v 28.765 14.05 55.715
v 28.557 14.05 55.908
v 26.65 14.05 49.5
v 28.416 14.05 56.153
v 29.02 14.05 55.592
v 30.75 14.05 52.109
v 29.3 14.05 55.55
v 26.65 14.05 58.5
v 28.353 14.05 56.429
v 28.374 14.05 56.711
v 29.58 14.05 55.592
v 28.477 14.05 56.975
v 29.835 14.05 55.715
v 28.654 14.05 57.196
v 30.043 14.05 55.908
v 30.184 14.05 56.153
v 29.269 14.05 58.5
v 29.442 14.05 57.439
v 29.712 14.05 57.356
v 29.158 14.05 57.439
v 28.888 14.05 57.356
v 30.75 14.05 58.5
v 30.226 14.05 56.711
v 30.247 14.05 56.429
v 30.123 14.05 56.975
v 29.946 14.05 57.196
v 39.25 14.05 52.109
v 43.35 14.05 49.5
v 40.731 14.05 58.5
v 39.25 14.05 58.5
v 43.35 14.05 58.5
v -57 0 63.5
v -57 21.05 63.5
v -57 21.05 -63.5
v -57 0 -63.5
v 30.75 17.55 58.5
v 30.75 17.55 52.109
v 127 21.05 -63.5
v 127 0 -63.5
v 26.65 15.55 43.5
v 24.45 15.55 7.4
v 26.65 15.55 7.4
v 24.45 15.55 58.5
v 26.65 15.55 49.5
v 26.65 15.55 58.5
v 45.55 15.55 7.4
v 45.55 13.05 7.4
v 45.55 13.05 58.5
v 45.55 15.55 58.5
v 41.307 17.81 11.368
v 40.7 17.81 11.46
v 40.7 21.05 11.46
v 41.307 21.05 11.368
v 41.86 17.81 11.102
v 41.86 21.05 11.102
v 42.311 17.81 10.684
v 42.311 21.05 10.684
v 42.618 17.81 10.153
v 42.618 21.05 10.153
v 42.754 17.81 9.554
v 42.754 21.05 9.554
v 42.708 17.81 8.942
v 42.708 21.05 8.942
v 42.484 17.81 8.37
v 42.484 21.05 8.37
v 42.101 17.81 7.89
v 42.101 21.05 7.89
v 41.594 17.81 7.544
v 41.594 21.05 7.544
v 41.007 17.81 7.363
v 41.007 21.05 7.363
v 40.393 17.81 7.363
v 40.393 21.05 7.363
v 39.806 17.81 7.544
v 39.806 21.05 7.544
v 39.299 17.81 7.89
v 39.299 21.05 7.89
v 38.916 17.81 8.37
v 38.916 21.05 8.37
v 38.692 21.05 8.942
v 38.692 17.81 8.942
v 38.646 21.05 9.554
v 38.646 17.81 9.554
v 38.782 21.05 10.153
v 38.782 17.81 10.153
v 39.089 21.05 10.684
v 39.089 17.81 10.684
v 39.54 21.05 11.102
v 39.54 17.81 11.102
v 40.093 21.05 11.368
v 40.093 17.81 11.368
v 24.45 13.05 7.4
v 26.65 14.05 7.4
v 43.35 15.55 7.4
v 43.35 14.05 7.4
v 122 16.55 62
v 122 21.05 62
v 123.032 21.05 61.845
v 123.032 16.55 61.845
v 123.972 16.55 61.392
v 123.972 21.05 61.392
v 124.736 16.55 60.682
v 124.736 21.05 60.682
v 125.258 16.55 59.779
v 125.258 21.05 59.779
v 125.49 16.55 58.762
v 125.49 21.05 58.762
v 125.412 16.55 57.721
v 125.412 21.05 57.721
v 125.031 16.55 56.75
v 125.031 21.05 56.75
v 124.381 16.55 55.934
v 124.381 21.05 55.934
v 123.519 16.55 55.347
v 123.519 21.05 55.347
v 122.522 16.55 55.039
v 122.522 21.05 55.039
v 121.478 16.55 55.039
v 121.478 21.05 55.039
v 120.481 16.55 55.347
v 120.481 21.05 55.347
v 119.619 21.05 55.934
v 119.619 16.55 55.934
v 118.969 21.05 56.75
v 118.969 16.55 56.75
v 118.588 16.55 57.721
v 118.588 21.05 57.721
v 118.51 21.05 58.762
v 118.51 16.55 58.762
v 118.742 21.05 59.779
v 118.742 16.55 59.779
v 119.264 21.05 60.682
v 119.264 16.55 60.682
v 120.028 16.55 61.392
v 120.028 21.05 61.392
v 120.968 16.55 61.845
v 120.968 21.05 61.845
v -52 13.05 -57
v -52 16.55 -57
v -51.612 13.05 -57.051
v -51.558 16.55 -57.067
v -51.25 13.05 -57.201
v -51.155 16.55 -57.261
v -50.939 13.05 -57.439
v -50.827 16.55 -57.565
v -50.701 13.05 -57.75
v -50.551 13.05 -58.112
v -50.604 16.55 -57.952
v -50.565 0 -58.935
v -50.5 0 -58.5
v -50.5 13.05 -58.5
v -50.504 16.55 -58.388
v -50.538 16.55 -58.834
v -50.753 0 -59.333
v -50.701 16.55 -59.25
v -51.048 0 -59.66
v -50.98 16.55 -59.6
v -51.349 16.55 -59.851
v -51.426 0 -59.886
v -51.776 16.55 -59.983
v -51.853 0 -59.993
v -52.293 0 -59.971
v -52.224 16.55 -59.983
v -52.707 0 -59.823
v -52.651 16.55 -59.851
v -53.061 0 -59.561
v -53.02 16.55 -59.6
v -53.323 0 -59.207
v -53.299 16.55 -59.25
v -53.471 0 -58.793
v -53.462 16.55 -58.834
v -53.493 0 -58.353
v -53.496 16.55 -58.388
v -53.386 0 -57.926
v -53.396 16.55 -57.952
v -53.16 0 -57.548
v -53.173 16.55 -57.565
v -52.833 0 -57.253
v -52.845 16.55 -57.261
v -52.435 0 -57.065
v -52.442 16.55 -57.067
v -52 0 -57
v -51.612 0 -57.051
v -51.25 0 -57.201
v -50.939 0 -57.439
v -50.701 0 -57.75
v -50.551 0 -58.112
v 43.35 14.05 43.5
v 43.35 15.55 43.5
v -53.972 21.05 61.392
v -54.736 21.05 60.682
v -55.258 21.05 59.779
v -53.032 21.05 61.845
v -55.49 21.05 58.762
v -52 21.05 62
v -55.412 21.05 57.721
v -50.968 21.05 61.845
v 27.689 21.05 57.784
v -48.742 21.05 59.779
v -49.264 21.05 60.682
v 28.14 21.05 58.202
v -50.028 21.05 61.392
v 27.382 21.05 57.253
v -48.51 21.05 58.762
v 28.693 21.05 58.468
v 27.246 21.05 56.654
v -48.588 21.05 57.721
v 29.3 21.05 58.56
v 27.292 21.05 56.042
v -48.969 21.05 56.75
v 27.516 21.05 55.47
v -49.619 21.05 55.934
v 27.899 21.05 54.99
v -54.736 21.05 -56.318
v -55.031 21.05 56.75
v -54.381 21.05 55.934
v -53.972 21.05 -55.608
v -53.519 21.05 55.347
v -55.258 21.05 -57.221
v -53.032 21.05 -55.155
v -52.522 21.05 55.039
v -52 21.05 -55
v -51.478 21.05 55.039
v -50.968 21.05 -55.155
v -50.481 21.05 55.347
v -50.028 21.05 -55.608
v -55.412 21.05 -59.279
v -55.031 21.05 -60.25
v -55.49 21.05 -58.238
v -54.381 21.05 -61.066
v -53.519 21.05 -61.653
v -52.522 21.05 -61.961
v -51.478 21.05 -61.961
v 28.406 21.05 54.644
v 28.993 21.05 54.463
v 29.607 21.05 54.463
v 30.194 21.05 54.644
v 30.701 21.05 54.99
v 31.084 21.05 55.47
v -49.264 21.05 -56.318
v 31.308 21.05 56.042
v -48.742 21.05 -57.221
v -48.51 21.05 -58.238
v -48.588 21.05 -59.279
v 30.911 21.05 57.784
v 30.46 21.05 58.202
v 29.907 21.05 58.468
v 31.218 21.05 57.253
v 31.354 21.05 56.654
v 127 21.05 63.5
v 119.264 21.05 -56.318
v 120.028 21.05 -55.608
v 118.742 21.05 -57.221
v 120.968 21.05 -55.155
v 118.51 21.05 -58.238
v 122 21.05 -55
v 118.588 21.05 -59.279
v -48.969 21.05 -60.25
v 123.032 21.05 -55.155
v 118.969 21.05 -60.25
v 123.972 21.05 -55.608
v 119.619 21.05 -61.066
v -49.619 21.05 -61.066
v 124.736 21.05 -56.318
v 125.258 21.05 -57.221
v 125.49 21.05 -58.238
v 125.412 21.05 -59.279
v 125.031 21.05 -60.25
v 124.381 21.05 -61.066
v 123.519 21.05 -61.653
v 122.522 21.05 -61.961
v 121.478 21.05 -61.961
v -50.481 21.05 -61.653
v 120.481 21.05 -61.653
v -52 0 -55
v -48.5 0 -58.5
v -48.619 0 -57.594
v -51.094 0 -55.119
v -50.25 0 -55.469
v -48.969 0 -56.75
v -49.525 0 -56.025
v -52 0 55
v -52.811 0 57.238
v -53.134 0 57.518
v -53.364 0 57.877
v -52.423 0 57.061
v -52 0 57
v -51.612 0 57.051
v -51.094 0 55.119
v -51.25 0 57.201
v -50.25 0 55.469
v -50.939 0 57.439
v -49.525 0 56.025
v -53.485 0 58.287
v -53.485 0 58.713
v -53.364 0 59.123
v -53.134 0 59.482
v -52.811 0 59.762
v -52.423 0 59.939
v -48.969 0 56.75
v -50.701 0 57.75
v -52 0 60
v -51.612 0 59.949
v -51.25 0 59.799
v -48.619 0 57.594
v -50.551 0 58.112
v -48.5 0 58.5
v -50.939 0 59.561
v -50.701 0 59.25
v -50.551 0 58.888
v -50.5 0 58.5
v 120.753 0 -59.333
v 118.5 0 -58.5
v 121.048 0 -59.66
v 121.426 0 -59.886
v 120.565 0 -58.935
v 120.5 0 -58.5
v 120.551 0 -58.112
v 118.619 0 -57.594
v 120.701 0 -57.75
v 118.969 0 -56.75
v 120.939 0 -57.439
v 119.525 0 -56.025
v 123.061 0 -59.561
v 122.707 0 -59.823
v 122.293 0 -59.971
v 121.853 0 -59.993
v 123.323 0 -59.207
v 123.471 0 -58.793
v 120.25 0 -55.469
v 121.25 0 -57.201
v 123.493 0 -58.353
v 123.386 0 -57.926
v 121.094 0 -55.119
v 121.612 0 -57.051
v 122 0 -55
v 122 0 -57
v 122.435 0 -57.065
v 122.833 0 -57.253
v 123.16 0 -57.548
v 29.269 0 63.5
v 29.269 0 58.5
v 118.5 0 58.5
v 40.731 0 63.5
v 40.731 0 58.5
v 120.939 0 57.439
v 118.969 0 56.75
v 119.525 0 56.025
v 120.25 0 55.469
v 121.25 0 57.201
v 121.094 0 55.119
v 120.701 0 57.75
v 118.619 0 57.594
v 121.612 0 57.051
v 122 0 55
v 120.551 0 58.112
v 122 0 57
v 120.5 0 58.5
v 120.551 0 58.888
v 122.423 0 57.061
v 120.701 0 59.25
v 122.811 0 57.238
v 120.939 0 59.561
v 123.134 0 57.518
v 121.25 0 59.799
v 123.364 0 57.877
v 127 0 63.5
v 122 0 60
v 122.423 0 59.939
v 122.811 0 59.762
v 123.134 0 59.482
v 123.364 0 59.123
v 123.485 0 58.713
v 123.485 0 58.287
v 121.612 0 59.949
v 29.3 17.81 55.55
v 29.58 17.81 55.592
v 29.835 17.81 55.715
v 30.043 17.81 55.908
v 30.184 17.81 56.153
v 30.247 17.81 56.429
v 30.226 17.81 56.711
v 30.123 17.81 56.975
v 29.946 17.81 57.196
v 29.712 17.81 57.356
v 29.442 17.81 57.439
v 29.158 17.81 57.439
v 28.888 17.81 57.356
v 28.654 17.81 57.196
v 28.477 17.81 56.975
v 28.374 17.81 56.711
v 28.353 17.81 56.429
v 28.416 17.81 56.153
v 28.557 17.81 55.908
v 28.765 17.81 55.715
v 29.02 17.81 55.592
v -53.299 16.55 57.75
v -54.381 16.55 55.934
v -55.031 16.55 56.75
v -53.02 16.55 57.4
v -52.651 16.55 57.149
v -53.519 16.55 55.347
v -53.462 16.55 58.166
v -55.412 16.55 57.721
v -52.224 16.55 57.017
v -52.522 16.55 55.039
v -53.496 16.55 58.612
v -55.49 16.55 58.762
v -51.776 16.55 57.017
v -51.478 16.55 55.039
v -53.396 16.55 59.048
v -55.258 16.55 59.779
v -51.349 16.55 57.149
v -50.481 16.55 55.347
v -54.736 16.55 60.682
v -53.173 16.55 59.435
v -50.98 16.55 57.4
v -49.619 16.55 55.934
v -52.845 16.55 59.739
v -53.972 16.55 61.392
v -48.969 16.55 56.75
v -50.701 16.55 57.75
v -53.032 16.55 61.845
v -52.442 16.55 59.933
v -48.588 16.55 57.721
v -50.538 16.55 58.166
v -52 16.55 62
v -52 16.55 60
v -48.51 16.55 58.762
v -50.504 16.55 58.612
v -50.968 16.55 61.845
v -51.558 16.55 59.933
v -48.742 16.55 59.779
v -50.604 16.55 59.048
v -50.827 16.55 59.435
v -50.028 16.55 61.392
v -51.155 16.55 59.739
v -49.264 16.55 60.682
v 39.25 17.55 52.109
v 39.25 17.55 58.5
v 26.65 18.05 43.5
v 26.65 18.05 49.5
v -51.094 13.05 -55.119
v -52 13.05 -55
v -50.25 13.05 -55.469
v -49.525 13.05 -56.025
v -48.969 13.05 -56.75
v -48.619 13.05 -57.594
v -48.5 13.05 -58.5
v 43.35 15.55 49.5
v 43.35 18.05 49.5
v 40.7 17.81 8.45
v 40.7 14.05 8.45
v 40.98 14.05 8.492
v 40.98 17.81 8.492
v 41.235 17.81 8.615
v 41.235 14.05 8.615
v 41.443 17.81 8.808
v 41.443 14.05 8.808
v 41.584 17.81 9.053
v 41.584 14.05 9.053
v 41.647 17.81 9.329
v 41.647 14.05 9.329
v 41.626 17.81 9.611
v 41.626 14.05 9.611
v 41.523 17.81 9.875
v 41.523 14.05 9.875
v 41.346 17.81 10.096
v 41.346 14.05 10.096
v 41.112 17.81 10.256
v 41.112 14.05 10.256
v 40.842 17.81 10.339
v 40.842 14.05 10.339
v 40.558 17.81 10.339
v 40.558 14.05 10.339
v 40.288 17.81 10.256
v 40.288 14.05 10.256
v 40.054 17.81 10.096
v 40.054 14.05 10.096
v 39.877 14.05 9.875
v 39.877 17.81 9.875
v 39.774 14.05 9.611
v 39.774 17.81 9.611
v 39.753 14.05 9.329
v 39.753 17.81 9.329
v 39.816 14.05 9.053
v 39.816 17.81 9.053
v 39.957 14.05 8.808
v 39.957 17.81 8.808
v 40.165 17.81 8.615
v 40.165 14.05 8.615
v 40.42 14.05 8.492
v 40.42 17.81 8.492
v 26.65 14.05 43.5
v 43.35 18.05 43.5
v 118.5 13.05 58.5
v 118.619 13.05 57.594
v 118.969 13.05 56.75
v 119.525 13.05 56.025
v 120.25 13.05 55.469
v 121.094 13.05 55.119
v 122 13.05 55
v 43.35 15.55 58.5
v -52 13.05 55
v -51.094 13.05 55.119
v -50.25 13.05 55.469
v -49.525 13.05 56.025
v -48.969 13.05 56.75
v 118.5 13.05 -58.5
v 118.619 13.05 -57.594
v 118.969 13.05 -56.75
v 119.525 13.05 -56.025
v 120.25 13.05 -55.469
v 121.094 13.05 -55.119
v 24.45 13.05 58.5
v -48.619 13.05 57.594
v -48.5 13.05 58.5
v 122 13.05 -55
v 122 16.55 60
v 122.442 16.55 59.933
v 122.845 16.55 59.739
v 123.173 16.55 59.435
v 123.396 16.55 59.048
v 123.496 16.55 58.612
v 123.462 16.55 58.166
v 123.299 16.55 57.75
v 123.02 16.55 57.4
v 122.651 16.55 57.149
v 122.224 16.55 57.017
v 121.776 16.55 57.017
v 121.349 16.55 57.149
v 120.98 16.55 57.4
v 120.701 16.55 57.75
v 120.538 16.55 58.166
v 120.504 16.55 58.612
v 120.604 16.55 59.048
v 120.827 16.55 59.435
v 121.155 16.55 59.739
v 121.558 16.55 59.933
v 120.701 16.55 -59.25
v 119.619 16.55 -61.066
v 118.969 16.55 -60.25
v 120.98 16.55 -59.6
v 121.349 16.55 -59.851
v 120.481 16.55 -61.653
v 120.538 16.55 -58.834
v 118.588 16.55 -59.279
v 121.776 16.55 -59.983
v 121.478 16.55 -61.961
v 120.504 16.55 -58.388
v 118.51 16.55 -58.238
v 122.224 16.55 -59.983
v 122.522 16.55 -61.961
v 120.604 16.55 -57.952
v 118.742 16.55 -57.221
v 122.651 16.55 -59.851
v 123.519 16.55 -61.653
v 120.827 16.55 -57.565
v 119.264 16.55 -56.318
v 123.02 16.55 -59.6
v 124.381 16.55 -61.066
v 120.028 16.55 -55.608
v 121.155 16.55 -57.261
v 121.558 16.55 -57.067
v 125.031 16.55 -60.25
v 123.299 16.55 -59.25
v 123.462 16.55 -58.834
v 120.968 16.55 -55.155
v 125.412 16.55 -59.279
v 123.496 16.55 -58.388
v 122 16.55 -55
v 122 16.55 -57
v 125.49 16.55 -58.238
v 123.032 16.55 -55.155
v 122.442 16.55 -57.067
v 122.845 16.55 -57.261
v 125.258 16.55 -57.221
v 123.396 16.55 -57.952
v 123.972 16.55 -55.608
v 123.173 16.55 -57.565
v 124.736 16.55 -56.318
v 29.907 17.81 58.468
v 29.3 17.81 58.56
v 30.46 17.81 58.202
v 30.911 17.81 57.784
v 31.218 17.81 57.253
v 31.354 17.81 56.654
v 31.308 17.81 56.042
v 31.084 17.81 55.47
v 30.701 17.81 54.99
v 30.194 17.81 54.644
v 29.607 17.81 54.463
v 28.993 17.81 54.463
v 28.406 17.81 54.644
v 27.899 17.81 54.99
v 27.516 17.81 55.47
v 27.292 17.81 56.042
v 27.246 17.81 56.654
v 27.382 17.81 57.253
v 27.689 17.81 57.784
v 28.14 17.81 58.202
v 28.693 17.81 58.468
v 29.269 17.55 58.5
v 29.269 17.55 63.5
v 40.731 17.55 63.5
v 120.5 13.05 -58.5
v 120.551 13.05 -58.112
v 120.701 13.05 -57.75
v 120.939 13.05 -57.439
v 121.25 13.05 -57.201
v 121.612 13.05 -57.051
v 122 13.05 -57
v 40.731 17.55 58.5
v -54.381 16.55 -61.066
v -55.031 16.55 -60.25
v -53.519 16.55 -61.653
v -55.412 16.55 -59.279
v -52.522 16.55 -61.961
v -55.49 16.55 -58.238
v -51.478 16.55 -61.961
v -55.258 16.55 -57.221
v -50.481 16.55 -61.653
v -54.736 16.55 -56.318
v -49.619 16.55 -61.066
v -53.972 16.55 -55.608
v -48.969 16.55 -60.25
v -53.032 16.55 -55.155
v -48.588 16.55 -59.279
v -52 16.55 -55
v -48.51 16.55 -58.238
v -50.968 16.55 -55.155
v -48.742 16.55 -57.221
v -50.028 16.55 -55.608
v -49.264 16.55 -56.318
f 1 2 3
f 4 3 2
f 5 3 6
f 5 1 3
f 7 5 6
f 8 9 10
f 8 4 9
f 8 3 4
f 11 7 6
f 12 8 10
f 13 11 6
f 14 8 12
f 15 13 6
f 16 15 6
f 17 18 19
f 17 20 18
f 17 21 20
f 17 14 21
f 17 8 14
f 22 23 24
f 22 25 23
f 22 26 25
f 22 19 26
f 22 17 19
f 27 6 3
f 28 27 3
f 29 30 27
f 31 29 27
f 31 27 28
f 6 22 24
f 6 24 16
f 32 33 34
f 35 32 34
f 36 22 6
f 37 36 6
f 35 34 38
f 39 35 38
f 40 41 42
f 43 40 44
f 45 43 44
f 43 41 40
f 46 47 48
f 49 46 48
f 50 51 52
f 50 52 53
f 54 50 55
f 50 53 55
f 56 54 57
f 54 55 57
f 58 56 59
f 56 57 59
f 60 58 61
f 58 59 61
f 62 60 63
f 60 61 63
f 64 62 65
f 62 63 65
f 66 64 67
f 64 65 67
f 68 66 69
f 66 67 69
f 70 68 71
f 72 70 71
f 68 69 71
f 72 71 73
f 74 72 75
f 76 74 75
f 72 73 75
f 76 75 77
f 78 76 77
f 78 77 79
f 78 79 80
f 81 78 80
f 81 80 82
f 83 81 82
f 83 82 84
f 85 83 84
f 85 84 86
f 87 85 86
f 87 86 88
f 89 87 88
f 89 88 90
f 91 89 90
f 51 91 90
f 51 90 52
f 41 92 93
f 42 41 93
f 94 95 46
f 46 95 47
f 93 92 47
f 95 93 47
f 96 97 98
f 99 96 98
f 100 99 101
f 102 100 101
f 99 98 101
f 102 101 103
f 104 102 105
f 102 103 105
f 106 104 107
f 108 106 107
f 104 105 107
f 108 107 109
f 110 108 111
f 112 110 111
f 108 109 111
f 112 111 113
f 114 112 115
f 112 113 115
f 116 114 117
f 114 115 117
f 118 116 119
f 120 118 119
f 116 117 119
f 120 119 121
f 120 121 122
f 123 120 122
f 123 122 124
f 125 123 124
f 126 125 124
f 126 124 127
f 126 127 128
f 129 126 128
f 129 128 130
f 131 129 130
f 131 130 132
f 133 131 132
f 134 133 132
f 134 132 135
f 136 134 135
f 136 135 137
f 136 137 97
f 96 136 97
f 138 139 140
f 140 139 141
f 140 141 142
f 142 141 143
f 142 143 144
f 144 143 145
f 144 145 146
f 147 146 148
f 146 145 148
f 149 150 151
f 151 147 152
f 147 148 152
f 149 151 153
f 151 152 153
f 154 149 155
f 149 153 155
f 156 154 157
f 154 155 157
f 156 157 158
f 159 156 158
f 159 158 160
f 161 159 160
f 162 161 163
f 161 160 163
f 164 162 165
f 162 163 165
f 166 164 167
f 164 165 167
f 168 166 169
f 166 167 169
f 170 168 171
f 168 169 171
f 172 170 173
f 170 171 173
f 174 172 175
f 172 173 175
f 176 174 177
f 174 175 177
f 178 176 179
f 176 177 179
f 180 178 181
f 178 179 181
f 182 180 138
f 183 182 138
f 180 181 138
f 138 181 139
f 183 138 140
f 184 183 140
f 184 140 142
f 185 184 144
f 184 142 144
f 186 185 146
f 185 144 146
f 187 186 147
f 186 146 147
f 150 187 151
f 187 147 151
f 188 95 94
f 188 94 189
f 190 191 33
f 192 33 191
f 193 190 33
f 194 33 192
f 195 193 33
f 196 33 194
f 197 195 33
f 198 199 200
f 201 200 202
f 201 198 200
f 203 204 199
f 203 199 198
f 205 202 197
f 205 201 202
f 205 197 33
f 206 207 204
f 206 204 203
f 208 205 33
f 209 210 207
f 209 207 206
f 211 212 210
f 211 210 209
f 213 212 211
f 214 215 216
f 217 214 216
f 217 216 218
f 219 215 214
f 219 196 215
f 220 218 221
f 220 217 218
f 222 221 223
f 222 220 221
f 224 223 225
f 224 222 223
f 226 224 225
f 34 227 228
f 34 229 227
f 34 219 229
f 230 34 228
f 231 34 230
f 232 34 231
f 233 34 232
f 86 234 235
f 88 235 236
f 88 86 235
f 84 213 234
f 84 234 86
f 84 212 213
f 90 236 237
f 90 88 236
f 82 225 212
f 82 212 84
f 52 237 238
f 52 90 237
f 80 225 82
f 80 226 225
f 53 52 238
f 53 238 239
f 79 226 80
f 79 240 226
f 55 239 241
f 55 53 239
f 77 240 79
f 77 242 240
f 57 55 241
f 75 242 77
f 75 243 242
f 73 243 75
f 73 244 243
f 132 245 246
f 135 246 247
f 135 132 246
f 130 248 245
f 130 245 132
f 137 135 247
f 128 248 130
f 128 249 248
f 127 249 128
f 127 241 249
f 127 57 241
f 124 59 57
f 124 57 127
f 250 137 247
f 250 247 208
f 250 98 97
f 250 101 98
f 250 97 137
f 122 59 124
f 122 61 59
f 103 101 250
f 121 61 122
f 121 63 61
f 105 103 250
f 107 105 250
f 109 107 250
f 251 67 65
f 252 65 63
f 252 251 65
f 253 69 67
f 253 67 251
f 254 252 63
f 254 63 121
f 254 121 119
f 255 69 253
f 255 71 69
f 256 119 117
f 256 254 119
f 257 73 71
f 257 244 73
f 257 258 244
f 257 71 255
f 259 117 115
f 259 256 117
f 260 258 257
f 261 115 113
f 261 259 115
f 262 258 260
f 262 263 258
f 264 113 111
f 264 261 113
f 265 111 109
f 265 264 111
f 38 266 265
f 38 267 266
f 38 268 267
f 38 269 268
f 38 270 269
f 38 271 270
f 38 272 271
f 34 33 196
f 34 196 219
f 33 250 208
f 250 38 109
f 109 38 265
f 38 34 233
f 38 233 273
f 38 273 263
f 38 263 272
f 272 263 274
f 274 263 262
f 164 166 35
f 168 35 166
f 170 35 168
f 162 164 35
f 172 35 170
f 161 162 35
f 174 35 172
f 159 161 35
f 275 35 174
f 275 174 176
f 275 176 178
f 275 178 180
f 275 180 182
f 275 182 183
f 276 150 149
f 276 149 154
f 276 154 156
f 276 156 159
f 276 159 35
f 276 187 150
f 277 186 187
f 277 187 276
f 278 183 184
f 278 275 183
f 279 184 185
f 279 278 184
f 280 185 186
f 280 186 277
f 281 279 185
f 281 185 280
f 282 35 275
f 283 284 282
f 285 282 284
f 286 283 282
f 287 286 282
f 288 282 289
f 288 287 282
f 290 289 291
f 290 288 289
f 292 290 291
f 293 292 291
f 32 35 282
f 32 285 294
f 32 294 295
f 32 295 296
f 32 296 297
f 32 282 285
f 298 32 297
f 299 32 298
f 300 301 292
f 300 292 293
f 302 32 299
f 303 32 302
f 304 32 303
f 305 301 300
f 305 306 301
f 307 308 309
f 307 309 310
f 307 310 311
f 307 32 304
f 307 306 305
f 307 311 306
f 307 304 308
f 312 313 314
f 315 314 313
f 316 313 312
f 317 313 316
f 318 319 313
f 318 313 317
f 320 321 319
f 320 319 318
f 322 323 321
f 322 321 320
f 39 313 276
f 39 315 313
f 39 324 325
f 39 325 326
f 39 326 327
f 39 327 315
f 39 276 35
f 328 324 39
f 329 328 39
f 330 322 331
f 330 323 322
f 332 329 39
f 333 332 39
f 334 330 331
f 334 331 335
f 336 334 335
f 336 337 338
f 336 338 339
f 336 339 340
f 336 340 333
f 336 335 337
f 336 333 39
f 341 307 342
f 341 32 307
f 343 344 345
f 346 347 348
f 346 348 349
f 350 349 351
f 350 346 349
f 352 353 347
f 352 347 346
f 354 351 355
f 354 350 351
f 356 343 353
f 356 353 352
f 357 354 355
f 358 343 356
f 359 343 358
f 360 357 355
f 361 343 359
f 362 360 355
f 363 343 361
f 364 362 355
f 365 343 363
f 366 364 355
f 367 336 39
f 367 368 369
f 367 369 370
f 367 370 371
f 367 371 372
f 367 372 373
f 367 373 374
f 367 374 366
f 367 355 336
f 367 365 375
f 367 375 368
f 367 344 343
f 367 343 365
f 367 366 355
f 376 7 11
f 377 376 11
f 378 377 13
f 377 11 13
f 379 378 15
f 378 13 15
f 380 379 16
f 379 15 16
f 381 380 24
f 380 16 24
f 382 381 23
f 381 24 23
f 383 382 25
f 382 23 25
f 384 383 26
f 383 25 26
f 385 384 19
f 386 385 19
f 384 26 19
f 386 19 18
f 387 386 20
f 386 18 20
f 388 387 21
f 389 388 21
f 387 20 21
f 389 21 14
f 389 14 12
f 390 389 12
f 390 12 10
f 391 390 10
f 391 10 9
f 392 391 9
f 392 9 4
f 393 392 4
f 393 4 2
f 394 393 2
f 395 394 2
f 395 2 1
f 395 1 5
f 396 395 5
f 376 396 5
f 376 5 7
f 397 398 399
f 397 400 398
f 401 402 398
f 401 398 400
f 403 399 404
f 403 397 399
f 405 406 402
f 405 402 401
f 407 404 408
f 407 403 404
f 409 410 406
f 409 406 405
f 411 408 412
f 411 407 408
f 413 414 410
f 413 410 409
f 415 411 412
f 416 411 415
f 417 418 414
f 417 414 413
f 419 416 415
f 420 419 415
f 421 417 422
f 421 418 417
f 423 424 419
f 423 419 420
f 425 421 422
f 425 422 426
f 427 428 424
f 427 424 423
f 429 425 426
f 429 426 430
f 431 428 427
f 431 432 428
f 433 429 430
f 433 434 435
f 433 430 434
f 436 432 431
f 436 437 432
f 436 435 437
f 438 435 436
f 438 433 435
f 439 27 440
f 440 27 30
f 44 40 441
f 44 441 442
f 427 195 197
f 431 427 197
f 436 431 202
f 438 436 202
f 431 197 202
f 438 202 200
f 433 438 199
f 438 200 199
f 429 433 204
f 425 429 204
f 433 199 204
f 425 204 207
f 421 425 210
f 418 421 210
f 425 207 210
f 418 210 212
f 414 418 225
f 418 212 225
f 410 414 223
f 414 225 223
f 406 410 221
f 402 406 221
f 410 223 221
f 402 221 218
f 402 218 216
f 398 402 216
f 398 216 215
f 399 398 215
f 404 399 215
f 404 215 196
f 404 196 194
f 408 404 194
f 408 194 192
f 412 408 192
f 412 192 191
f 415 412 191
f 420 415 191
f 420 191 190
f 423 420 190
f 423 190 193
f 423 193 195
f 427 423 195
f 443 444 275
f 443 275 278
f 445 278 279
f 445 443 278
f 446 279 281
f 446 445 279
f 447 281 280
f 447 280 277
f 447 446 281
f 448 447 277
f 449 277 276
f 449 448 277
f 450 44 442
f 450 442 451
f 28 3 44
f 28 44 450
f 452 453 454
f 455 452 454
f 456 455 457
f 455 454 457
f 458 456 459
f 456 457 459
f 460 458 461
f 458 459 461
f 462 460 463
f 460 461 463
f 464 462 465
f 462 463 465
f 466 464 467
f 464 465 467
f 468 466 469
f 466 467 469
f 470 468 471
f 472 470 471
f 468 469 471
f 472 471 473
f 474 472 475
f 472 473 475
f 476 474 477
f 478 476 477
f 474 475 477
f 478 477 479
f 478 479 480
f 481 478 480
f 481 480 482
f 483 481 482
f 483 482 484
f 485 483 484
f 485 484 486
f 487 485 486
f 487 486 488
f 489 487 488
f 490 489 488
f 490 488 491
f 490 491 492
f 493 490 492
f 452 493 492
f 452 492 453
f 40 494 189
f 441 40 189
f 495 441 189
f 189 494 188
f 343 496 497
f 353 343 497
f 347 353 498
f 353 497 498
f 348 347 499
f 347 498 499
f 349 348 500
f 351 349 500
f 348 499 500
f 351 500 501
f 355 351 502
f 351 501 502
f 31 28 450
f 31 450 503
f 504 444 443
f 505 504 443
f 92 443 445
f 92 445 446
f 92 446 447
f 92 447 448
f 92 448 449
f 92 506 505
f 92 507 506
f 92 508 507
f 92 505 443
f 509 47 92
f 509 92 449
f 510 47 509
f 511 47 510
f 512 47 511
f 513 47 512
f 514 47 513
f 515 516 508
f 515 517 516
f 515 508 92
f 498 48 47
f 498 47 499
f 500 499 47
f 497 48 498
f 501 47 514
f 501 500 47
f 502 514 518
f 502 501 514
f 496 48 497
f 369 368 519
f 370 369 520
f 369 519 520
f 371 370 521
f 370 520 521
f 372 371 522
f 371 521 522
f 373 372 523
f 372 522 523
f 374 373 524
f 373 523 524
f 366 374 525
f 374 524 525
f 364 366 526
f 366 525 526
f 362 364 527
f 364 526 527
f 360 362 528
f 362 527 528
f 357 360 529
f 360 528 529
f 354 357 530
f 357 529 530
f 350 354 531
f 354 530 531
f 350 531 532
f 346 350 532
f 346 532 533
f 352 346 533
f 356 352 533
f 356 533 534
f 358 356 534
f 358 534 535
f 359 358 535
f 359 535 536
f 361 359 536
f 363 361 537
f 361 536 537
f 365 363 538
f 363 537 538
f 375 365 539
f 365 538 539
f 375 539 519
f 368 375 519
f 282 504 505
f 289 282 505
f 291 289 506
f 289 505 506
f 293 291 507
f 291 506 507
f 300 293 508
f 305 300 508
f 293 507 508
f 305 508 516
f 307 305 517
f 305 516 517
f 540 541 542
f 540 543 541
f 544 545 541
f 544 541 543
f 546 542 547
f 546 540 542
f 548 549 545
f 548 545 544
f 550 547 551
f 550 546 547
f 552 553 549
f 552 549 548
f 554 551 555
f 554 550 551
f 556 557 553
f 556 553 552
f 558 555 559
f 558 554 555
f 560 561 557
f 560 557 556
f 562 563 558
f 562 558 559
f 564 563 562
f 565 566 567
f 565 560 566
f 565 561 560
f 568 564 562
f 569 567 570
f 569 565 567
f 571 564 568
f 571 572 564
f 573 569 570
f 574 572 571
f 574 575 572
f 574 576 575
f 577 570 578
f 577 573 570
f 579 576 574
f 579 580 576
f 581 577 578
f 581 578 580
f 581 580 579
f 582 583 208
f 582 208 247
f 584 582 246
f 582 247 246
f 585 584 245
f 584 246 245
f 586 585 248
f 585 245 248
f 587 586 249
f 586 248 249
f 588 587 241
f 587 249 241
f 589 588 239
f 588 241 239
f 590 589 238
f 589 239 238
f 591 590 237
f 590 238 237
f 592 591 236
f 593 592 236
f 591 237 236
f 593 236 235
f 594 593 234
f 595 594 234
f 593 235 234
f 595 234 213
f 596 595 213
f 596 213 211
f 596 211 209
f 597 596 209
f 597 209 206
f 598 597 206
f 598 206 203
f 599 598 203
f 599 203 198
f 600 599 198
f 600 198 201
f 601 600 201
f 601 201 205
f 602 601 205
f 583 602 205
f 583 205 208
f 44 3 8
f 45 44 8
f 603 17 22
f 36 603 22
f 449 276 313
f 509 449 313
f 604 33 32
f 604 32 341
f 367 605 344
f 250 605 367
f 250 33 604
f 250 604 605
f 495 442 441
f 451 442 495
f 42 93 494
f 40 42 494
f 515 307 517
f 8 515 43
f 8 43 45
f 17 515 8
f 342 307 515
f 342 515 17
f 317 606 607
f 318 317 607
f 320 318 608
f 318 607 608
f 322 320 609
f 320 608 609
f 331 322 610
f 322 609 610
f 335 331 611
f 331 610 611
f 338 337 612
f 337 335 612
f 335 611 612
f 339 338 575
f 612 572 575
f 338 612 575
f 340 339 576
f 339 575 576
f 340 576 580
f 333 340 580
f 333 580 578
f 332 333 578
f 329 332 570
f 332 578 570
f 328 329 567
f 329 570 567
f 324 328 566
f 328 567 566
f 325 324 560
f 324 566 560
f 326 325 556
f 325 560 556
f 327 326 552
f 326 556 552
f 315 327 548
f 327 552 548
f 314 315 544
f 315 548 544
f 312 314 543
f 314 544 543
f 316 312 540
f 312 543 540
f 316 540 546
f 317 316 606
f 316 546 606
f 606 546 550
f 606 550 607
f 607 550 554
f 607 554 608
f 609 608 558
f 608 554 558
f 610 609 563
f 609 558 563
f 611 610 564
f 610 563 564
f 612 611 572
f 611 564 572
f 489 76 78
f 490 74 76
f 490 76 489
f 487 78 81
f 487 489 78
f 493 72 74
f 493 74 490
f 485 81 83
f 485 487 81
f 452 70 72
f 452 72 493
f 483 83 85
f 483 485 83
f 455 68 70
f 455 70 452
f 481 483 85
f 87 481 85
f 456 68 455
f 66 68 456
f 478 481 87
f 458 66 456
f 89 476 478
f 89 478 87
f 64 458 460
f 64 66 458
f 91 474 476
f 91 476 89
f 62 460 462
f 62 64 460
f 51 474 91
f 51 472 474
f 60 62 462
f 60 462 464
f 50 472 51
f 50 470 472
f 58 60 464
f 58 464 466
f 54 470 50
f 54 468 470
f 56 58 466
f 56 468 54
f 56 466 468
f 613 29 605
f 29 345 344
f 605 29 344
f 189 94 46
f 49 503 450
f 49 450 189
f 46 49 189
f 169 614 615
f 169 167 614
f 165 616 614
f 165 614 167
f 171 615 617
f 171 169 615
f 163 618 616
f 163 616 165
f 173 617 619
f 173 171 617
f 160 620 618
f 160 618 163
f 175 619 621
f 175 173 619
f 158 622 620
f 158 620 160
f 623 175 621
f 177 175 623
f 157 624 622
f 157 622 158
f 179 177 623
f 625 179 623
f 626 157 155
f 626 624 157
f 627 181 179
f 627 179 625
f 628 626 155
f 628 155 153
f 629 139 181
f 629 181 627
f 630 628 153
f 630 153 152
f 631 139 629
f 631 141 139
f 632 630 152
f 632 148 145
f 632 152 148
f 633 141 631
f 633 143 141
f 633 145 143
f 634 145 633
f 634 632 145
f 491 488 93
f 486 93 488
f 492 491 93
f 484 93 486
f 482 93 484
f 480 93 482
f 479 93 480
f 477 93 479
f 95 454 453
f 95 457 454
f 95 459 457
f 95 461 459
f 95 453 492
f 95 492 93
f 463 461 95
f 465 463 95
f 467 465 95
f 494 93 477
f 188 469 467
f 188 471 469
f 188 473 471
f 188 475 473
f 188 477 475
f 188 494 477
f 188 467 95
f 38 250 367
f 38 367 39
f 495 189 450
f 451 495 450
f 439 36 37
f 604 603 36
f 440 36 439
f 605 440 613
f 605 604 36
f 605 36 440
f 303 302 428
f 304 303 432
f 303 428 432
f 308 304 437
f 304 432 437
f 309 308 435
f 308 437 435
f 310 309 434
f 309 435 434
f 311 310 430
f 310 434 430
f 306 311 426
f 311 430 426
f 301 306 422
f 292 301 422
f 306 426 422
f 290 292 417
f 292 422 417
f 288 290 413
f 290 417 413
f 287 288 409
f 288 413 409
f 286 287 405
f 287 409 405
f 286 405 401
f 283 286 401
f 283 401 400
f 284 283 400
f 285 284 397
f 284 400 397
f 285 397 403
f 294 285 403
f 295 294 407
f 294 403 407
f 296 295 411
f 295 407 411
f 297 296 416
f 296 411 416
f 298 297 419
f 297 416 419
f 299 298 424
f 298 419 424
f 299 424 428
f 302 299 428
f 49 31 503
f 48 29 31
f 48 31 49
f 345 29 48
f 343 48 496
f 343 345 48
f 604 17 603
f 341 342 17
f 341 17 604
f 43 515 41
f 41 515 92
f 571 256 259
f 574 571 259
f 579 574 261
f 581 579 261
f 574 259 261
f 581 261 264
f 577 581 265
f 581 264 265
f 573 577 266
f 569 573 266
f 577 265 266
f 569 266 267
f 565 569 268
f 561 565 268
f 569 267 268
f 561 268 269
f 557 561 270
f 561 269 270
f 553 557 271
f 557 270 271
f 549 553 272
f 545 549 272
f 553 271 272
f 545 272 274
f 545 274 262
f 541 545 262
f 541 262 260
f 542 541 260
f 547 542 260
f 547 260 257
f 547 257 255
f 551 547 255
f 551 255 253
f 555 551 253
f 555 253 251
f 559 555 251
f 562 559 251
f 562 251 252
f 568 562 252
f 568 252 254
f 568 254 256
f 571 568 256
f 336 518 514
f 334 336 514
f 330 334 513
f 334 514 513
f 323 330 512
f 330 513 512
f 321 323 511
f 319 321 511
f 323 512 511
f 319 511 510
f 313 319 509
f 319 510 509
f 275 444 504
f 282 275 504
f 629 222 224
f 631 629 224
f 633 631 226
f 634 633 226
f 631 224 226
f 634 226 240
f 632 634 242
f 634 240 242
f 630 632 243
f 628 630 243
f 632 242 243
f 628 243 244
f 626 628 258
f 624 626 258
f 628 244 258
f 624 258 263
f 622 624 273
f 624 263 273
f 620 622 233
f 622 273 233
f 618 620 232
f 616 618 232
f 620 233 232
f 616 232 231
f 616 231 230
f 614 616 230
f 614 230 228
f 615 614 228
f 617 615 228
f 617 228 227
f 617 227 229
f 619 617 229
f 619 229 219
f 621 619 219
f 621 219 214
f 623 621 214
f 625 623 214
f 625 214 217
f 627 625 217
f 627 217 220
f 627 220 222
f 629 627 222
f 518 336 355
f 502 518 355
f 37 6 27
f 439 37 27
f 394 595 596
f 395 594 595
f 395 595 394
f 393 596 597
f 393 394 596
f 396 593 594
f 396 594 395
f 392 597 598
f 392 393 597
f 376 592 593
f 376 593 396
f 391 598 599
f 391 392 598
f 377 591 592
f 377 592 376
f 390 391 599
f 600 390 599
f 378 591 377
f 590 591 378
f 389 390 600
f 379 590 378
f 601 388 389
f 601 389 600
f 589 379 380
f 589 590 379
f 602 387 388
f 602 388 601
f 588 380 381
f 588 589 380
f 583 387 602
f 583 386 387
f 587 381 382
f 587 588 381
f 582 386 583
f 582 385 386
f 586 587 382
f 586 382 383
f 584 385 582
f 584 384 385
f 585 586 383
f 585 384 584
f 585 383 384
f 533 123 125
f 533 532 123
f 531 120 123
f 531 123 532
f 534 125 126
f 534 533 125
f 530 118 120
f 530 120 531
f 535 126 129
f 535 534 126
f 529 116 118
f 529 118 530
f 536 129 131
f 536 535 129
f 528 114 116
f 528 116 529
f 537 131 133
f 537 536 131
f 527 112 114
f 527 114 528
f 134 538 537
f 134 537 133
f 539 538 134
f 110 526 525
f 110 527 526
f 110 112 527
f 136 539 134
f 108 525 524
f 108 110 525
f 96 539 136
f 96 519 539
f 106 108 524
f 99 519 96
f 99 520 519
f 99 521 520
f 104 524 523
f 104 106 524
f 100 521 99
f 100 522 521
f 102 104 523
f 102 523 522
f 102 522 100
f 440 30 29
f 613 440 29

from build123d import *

# Parameters (mm, degrees)
SKETCH1_W           = 254
SKETCH1_H           = 127
BOSS_EXTRUDE2_DEPTH = 19.05
SKETCH2_W           = 244
SKETCH2_H           = 117
CUT_EXTRUDE1_DEPTH  = 17.05
SKETCH4_W           = 70
SKETCH4_H           = 127
CUT_EXTRUDE2_DEPTH  = 44
SKETCH6_W           = 5
SKETCH6_H           = 117
BOSS_EXTRUDE3_DEPTH = 17.05
SKETCH9_W           = 174
SKETCH9_H           = 117
BOSS_EXTRUDE4_DEPTH = 4
SKETCH12_W          = 8.5
SKETCH12_H          = 5
CUT_EXTRUDE3_DEPTH  = 13.05
CUT_EXTRUDE4_DEPTH  = 1
CUT_EXTRUDE5_DEPTH  = 4.5
SKETCH17_W          = 2.2
SKETCH17_H          = 51.1
CUT_EXTRUDE6_DEPTH  = 1.5
SKETCH19_W          = 7.4
SKETCH19_H          = 6
CUT_EXTRUDE7_DEPTH  = 4
SKETCH20_R          = 3.5
CUT_EXTRUDE8_DEPTH  = 2.5
SKETCH23_R          = 1.5
CUT_EXTRUDE9_DEPTH  = 38
BOSS_EXTRUDE5_DEPTH = 13.05
SKETCH25_W          = 9.3
SKETCH25_H          = 6
CUT_EXTRUDE10_DEPTH = 4
SKETCH26_W          = 8.5
SKETCH26_H          = 1.89071474
CUT_EXTRUDE11_DEPTH = 3.5
SKETCH27_R          = 0.95
CUT_EXTRUDE13_DEPTH = 25
SKETCH28_R          = 2.06
CUT_EXTRUDE18_DEPTH = 1.24
BOSS_EXTRUDE6_START = 2
SKETCH31_W          = 184
SKETCH31_H          = 127
SKETCH31_R          = 2.06
SKETCH31_R_2        = 3.5
BOSS_EXTRUDE6_DEPTH = 2
CUT_EXTRUDE19_REACH = 145.542
SKETCH14_W          = 11.462803728
SKETCH14_H          = 5


with BuildPart() as part:
    # Sketch1 → Boss-Extrude2 (new body)
    with BuildSketch(Plane(origin=(0, 0, 0), x_dir=(1, 0, 0), z_dir=(0, 1, 0))):
        Rectangle(SKETCH1_W, SKETCH1_H)
    extrude(amount=BOSS_EXTRUDE2_DEPTH)

    # Sketch2 → Cut-Extrude1 (cut)
    with BuildSketch(Plane.XZ):
        Rectangle(SKETCH2_W, SKETCH2_H)
    extrude(amount=-CUT_EXTRUDE1_DEPTH, mode=Mode.SUBTRACT)

    # Sketch4 → Cut-Extrude2 (cut)
    with BuildSketch(Plane(origin=(0, 19.05, 0), x_dir=(1, 0, 0), z_dir=(0, 1, 0))):
        with Locations((-92, 0)):
            Rectangle(SKETCH4_W, SKETCH4_H)
    extrude(amount=-CUT_EXTRUDE2_DEPTH, mode=Mode.SUBTRACT)

    # Sketch6 → Boss-Extrude3 (add)
    with BuildSketch(Plane.XZ.offset(-17.05)):
        with Locations((-54.5, 0)):
            Rectangle(SKETCH6_W, SKETCH6_H)
    extrude(amount=BOSS_EXTRUDE3_DEPTH)

    # Sketch9 → Boss-Extrude4 (add)
    with BuildSketch(Plane.XZ.offset(-17.05)):
        with Locations((35, 0)):
            Rectangle(SKETCH9_W, SKETCH9_H)
    extrude(amount=BOSS_EXTRUDE4_DEPTH)

    # Sketch12 → Cut-Extrude3 (cut)
    with BuildSketch(Plane.XZ):
        with Locations((35, 61)):
            Rectangle(SKETCH12_W, SKETCH12_H)
    extrude(amount=-CUT_EXTRUDE3_DEPTH, mode=Mode.SUBTRACT)

    # Sketch13 → Cut-Extrude4 (cut)
    with BuildSketch(Plane.XZ.offset(-13.05)):
        Polygon((30.75, 58.5), (24.45, 58.5), (24.45, 7.4), (45.55, 7.4), (45.55, 58.5), (39.25, 58.5), (39.25, 54), (30.75, 54), align=None)
    extrude(amount=-CUT_EXTRUDE4_DEPTH, mode=Mode.SUBTRACT)

    # Sketch15 → Cut-Extrude5 (cut)
    with BuildSketch(Plane.XZ.offset(-13.05)):
        Polygon((30.75, 54), (39.25, 54), (39.25, 58.5), (39.25, 63.5), (30.75, 63.5), (30.75, 58.5), align=None)
    extrude(amount=-CUT_EXTRUDE5_DEPTH, mode=Mode.SUBTRACT)

    # Sketch17 → Cut-Extrude6 (cut)
    with BuildSketch(Plane.XZ.offset(-14.05)):
        with Locations((25.55, 32.95)):
            Rectangle(SKETCH17_W, SKETCH17_H)
        with Locations((44.45, 32.95)):
            Rectangle(SKETCH17_W, SKETCH17_H)
    extrude(amount=-CUT_EXTRUDE6_DEPTH, mode=Mode.SUBTRACT)

    # Sketch19 → Cut-Extrude7 (cut)
    with BuildSketch(Plane.XZ.offset(-14.05)):
        with Locations((30.35, 46.5)):
            Rectangle(SKETCH19_W, SKETCH19_H)
    extrude(amount=-CUT_EXTRUDE7_DEPTH, mode=Mode.SUBTRACT)

    # Sketch20 → Cut-Extrude8 (cut)
    with BuildSketch(Plane(origin=(0, 19.05, 0), x_dir=(1, 0, 0), z_dir=(0, 1, 0))):
        with Locations(Location((-52, -58.5, 0), (0, 0, 270))):
            Circle(SKETCH20_R)
        with Locations(Location((122, -58.5, 0), (0, 0, 270))):
            Circle(SKETCH20_R)
        with Locations(Location((122, 58.5, 0), (0, 0, 270))):
            Circle(SKETCH20_R)
        with Locations(Location((-52, 58.5, 0), (0, 0, 270))):
            Circle(SKETCH20_R)
    extrude(amount=-CUT_EXTRUDE8_DEPTH, mode=Mode.SUBTRACT)

    # Sketch23 → Cut-Extrude9 (cut)
    with BuildSketch(Plane(origin=(0, 16.55, 0), x_dir=(1, 0, 0), z_dir=(0, 1, 0))):
        with Locations(Location((-52, 58.5, 0), (0, 0, 270))):
            Circle(SKETCH23_R)
        with Locations(Location((-52, -58.5, 0), (0, 0, 270))):
            Circle(SKETCH23_R)
        with Locations(Location((122, -58.5, 0), (0, 0, 270))):
            Circle(SKETCH23_R)
        with Locations(Location((122, 58.5, 0), (0, 0, 270))):
            Circle(SKETCH23_R)
    extrude(amount=-CUT_EXTRUDE9_DEPTH, mode=Mode.SUBTRACT)

    # Sketch24 → Boss-Extrude5 (add)
    with BuildSketch(Plane.XZ.offset(-13.05)):
        with BuildLine():
            Line((-52, 57), (-52, 55))
            ThreePointArc((-52, 55), (-49.525126266, 56.025126266), (-48.5, 58.5))
            Line((-48.5, 58.5), (-50.5, 58.5))
            ThreePointArc((-50.5, 58.5), (-50.939339828, 57.439339828), (-52, 57))
        make_face()
        with BuildLine():
            Line((-48.5, -58.5), (-50.5, -58.5))
            ThreePointArc((-50.5, -58.5), (-50.939339828, -57.439339828), (-52, -57))
            Line((-52, -57), (-52, -55))
            ThreePointArc((-52, -55), (-49.525126266, -56.025126266), (-48.5, -58.5))
        make_face()
        with BuildLine():
            Line((122, 55), (122, 57))
            ThreePointArc((122, 57), (120.939339828, 57.439339828), (120.5, 58.5))
            Line((120.5, 58.5), (118.5, 58.5))
            ThreePointArc((118.5, 58.5), (119.525126266, 56.025126266), (122, 55))
        make_face()
        with BuildLine():
            Line((122, -57), (122, -55))
            ThreePointArc((122, -55), (119.525126266, -56.025126266), (118.5, -58.5))
            Line((118.5, -58.5), (120.5, -58.5))
            ThreePointArc((120.5, -58.5), (120.939339828, -57.439339828), (122, -57))
        make_face()
    extrude(amount=BOSS_EXTRUDE5_DEPTH)

    # Sketch25 → Cut-Extrude10 (cut)
    with BuildSketch(Plane.XZ.offset(-14.05)):
        with Locations((38.7, 46.5)):
            Rectangle(SKETCH25_W, SKETCH25_H)
    extrude(amount=-CUT_EXTRUDE10_DEPTH, mode=Mode.SUBTRACT)

    # Sketch26 → Cut-Extrude11 (cut)
    with BuildSketch(Plane.XZ.offset(-14.05)):
        with Locations((35, 53.05464263)):
            Rectangle(SKETCH26_W, SKETCH26_H)
    extrude(amount=-CUT_EXTRUDE11_DEPTH, mode=Mode.SUBTRACT)

    # Sketch27 → Cut-Extrude13 (cut)
    with BuildSketch(Plane.XZ.offset(-14.05)):
        with Locations(Location((40.7, 9.4, 0), (0, 0, 270))):
            Circle(SKETCH27_R)
        with Locations(Location((29.3, 56.5, 0), (0, 0, 270))):
            Circle(SKETCH27_R)
    extrude(amount=-CUT_EXTRUDE13_DEPTH, mode=Mode.SUBTRACT)

    # Sketch28 → Cut-Extrude18 (cut)
    with BuildSketch(Plane(origin=(0, 19.05, 0), x_dir=(1, 0, 0), z_dir=(0, 1, 0))):
        with Locations(Location((40.7, -9.4, 0), (0, 0, 270))):
            Circle(SKETCH28_R)
        with Locations(Location((29.3, -56.5, 0), (0, 0, 270))):
            Circle(SKETCH28_R)
    extrude(amount=-CUT_EXTRUDE18_DEPTH, mode=Mode.SUBTRACT)

    # Sketch31 → Boss-Extrude6 (add)
    with BuildSketch(Plane(origin=(0, 19.05, 0), x_dir=(1, 0, 0), z_dir=(0, 1, 0)).offset(BOSS_EXTRUDE6_START)):
        with Locations((35, 0)):
            Rectangle(SKETCH31_W, SKETCH31_H)
        with Locations(Location((40.7, -9.4, 0), (0, 0, 270))):
            Circle(SKETCH31_R, mode=Mode.SUBTRACT)
        with Locations(Location((-52, 58.5, 0), (0, 0, 270))):
            Circle(SKETCH31_R_2, mode=Mode.SUBTRACT)
        with Locations(Location((-52, -58.5, 0), (0, 0, 270))):
            Circle(SKETCH31_R_2, mode=Mode.SUBTRACT)
        with Locations(Location((29.3, -56.5, 0), (0, 0, 270))):
            Circle(SKETCH31_R, mode=Mode.SUBTRACT)
        with Locations(Location((122, -58.5, 0), (0, 0, 270))):
            Circle(SKETCH31_R_2, mode=Mode.SUBTRACT)
        with Locations(Location((122, 58.5, 0), (0, 0, 270))):
            Circle(SKETCH31_R_2, mode=Mode.SUBTRACT)
    extrude(amount=-BOSS_EXTRUDE6_DEPTH)

    # Cut-Extrude19: up to this face of the body (flat: up to its plane)
    cut_extrude19_end = Plane(part.part.faces().sort_by_distance((35, 17.55, 57.80464263))[0])
    # Sketch14 → Cut-Extrude19 (cut, up to the picked face)
    with BuildSketch(Plane.XZ, mode=Mode.PRIVATE) as cut_extrude19_sk1:
        with Locations((35, 61)):
            Rectangle(SKETCH14_W, SKETCH14_H)
    cut_extrude19_tool1 = split(extrude(cut_extrude19_sk1.sketch, amount=-CUT_EXTRUDE19_REACH, mode=Mode.PRIVATE), bisect_by=cut_extrude19_end, keep=Keep.BOTH, mode=Mode.PRIVATE)
    add(cut_extrude19_tool1.solids().sort_by(Axis((35, 0, 61), (0, 1, 0)))[0], mode=Mode.SUBTRACT)


solid = part.part
